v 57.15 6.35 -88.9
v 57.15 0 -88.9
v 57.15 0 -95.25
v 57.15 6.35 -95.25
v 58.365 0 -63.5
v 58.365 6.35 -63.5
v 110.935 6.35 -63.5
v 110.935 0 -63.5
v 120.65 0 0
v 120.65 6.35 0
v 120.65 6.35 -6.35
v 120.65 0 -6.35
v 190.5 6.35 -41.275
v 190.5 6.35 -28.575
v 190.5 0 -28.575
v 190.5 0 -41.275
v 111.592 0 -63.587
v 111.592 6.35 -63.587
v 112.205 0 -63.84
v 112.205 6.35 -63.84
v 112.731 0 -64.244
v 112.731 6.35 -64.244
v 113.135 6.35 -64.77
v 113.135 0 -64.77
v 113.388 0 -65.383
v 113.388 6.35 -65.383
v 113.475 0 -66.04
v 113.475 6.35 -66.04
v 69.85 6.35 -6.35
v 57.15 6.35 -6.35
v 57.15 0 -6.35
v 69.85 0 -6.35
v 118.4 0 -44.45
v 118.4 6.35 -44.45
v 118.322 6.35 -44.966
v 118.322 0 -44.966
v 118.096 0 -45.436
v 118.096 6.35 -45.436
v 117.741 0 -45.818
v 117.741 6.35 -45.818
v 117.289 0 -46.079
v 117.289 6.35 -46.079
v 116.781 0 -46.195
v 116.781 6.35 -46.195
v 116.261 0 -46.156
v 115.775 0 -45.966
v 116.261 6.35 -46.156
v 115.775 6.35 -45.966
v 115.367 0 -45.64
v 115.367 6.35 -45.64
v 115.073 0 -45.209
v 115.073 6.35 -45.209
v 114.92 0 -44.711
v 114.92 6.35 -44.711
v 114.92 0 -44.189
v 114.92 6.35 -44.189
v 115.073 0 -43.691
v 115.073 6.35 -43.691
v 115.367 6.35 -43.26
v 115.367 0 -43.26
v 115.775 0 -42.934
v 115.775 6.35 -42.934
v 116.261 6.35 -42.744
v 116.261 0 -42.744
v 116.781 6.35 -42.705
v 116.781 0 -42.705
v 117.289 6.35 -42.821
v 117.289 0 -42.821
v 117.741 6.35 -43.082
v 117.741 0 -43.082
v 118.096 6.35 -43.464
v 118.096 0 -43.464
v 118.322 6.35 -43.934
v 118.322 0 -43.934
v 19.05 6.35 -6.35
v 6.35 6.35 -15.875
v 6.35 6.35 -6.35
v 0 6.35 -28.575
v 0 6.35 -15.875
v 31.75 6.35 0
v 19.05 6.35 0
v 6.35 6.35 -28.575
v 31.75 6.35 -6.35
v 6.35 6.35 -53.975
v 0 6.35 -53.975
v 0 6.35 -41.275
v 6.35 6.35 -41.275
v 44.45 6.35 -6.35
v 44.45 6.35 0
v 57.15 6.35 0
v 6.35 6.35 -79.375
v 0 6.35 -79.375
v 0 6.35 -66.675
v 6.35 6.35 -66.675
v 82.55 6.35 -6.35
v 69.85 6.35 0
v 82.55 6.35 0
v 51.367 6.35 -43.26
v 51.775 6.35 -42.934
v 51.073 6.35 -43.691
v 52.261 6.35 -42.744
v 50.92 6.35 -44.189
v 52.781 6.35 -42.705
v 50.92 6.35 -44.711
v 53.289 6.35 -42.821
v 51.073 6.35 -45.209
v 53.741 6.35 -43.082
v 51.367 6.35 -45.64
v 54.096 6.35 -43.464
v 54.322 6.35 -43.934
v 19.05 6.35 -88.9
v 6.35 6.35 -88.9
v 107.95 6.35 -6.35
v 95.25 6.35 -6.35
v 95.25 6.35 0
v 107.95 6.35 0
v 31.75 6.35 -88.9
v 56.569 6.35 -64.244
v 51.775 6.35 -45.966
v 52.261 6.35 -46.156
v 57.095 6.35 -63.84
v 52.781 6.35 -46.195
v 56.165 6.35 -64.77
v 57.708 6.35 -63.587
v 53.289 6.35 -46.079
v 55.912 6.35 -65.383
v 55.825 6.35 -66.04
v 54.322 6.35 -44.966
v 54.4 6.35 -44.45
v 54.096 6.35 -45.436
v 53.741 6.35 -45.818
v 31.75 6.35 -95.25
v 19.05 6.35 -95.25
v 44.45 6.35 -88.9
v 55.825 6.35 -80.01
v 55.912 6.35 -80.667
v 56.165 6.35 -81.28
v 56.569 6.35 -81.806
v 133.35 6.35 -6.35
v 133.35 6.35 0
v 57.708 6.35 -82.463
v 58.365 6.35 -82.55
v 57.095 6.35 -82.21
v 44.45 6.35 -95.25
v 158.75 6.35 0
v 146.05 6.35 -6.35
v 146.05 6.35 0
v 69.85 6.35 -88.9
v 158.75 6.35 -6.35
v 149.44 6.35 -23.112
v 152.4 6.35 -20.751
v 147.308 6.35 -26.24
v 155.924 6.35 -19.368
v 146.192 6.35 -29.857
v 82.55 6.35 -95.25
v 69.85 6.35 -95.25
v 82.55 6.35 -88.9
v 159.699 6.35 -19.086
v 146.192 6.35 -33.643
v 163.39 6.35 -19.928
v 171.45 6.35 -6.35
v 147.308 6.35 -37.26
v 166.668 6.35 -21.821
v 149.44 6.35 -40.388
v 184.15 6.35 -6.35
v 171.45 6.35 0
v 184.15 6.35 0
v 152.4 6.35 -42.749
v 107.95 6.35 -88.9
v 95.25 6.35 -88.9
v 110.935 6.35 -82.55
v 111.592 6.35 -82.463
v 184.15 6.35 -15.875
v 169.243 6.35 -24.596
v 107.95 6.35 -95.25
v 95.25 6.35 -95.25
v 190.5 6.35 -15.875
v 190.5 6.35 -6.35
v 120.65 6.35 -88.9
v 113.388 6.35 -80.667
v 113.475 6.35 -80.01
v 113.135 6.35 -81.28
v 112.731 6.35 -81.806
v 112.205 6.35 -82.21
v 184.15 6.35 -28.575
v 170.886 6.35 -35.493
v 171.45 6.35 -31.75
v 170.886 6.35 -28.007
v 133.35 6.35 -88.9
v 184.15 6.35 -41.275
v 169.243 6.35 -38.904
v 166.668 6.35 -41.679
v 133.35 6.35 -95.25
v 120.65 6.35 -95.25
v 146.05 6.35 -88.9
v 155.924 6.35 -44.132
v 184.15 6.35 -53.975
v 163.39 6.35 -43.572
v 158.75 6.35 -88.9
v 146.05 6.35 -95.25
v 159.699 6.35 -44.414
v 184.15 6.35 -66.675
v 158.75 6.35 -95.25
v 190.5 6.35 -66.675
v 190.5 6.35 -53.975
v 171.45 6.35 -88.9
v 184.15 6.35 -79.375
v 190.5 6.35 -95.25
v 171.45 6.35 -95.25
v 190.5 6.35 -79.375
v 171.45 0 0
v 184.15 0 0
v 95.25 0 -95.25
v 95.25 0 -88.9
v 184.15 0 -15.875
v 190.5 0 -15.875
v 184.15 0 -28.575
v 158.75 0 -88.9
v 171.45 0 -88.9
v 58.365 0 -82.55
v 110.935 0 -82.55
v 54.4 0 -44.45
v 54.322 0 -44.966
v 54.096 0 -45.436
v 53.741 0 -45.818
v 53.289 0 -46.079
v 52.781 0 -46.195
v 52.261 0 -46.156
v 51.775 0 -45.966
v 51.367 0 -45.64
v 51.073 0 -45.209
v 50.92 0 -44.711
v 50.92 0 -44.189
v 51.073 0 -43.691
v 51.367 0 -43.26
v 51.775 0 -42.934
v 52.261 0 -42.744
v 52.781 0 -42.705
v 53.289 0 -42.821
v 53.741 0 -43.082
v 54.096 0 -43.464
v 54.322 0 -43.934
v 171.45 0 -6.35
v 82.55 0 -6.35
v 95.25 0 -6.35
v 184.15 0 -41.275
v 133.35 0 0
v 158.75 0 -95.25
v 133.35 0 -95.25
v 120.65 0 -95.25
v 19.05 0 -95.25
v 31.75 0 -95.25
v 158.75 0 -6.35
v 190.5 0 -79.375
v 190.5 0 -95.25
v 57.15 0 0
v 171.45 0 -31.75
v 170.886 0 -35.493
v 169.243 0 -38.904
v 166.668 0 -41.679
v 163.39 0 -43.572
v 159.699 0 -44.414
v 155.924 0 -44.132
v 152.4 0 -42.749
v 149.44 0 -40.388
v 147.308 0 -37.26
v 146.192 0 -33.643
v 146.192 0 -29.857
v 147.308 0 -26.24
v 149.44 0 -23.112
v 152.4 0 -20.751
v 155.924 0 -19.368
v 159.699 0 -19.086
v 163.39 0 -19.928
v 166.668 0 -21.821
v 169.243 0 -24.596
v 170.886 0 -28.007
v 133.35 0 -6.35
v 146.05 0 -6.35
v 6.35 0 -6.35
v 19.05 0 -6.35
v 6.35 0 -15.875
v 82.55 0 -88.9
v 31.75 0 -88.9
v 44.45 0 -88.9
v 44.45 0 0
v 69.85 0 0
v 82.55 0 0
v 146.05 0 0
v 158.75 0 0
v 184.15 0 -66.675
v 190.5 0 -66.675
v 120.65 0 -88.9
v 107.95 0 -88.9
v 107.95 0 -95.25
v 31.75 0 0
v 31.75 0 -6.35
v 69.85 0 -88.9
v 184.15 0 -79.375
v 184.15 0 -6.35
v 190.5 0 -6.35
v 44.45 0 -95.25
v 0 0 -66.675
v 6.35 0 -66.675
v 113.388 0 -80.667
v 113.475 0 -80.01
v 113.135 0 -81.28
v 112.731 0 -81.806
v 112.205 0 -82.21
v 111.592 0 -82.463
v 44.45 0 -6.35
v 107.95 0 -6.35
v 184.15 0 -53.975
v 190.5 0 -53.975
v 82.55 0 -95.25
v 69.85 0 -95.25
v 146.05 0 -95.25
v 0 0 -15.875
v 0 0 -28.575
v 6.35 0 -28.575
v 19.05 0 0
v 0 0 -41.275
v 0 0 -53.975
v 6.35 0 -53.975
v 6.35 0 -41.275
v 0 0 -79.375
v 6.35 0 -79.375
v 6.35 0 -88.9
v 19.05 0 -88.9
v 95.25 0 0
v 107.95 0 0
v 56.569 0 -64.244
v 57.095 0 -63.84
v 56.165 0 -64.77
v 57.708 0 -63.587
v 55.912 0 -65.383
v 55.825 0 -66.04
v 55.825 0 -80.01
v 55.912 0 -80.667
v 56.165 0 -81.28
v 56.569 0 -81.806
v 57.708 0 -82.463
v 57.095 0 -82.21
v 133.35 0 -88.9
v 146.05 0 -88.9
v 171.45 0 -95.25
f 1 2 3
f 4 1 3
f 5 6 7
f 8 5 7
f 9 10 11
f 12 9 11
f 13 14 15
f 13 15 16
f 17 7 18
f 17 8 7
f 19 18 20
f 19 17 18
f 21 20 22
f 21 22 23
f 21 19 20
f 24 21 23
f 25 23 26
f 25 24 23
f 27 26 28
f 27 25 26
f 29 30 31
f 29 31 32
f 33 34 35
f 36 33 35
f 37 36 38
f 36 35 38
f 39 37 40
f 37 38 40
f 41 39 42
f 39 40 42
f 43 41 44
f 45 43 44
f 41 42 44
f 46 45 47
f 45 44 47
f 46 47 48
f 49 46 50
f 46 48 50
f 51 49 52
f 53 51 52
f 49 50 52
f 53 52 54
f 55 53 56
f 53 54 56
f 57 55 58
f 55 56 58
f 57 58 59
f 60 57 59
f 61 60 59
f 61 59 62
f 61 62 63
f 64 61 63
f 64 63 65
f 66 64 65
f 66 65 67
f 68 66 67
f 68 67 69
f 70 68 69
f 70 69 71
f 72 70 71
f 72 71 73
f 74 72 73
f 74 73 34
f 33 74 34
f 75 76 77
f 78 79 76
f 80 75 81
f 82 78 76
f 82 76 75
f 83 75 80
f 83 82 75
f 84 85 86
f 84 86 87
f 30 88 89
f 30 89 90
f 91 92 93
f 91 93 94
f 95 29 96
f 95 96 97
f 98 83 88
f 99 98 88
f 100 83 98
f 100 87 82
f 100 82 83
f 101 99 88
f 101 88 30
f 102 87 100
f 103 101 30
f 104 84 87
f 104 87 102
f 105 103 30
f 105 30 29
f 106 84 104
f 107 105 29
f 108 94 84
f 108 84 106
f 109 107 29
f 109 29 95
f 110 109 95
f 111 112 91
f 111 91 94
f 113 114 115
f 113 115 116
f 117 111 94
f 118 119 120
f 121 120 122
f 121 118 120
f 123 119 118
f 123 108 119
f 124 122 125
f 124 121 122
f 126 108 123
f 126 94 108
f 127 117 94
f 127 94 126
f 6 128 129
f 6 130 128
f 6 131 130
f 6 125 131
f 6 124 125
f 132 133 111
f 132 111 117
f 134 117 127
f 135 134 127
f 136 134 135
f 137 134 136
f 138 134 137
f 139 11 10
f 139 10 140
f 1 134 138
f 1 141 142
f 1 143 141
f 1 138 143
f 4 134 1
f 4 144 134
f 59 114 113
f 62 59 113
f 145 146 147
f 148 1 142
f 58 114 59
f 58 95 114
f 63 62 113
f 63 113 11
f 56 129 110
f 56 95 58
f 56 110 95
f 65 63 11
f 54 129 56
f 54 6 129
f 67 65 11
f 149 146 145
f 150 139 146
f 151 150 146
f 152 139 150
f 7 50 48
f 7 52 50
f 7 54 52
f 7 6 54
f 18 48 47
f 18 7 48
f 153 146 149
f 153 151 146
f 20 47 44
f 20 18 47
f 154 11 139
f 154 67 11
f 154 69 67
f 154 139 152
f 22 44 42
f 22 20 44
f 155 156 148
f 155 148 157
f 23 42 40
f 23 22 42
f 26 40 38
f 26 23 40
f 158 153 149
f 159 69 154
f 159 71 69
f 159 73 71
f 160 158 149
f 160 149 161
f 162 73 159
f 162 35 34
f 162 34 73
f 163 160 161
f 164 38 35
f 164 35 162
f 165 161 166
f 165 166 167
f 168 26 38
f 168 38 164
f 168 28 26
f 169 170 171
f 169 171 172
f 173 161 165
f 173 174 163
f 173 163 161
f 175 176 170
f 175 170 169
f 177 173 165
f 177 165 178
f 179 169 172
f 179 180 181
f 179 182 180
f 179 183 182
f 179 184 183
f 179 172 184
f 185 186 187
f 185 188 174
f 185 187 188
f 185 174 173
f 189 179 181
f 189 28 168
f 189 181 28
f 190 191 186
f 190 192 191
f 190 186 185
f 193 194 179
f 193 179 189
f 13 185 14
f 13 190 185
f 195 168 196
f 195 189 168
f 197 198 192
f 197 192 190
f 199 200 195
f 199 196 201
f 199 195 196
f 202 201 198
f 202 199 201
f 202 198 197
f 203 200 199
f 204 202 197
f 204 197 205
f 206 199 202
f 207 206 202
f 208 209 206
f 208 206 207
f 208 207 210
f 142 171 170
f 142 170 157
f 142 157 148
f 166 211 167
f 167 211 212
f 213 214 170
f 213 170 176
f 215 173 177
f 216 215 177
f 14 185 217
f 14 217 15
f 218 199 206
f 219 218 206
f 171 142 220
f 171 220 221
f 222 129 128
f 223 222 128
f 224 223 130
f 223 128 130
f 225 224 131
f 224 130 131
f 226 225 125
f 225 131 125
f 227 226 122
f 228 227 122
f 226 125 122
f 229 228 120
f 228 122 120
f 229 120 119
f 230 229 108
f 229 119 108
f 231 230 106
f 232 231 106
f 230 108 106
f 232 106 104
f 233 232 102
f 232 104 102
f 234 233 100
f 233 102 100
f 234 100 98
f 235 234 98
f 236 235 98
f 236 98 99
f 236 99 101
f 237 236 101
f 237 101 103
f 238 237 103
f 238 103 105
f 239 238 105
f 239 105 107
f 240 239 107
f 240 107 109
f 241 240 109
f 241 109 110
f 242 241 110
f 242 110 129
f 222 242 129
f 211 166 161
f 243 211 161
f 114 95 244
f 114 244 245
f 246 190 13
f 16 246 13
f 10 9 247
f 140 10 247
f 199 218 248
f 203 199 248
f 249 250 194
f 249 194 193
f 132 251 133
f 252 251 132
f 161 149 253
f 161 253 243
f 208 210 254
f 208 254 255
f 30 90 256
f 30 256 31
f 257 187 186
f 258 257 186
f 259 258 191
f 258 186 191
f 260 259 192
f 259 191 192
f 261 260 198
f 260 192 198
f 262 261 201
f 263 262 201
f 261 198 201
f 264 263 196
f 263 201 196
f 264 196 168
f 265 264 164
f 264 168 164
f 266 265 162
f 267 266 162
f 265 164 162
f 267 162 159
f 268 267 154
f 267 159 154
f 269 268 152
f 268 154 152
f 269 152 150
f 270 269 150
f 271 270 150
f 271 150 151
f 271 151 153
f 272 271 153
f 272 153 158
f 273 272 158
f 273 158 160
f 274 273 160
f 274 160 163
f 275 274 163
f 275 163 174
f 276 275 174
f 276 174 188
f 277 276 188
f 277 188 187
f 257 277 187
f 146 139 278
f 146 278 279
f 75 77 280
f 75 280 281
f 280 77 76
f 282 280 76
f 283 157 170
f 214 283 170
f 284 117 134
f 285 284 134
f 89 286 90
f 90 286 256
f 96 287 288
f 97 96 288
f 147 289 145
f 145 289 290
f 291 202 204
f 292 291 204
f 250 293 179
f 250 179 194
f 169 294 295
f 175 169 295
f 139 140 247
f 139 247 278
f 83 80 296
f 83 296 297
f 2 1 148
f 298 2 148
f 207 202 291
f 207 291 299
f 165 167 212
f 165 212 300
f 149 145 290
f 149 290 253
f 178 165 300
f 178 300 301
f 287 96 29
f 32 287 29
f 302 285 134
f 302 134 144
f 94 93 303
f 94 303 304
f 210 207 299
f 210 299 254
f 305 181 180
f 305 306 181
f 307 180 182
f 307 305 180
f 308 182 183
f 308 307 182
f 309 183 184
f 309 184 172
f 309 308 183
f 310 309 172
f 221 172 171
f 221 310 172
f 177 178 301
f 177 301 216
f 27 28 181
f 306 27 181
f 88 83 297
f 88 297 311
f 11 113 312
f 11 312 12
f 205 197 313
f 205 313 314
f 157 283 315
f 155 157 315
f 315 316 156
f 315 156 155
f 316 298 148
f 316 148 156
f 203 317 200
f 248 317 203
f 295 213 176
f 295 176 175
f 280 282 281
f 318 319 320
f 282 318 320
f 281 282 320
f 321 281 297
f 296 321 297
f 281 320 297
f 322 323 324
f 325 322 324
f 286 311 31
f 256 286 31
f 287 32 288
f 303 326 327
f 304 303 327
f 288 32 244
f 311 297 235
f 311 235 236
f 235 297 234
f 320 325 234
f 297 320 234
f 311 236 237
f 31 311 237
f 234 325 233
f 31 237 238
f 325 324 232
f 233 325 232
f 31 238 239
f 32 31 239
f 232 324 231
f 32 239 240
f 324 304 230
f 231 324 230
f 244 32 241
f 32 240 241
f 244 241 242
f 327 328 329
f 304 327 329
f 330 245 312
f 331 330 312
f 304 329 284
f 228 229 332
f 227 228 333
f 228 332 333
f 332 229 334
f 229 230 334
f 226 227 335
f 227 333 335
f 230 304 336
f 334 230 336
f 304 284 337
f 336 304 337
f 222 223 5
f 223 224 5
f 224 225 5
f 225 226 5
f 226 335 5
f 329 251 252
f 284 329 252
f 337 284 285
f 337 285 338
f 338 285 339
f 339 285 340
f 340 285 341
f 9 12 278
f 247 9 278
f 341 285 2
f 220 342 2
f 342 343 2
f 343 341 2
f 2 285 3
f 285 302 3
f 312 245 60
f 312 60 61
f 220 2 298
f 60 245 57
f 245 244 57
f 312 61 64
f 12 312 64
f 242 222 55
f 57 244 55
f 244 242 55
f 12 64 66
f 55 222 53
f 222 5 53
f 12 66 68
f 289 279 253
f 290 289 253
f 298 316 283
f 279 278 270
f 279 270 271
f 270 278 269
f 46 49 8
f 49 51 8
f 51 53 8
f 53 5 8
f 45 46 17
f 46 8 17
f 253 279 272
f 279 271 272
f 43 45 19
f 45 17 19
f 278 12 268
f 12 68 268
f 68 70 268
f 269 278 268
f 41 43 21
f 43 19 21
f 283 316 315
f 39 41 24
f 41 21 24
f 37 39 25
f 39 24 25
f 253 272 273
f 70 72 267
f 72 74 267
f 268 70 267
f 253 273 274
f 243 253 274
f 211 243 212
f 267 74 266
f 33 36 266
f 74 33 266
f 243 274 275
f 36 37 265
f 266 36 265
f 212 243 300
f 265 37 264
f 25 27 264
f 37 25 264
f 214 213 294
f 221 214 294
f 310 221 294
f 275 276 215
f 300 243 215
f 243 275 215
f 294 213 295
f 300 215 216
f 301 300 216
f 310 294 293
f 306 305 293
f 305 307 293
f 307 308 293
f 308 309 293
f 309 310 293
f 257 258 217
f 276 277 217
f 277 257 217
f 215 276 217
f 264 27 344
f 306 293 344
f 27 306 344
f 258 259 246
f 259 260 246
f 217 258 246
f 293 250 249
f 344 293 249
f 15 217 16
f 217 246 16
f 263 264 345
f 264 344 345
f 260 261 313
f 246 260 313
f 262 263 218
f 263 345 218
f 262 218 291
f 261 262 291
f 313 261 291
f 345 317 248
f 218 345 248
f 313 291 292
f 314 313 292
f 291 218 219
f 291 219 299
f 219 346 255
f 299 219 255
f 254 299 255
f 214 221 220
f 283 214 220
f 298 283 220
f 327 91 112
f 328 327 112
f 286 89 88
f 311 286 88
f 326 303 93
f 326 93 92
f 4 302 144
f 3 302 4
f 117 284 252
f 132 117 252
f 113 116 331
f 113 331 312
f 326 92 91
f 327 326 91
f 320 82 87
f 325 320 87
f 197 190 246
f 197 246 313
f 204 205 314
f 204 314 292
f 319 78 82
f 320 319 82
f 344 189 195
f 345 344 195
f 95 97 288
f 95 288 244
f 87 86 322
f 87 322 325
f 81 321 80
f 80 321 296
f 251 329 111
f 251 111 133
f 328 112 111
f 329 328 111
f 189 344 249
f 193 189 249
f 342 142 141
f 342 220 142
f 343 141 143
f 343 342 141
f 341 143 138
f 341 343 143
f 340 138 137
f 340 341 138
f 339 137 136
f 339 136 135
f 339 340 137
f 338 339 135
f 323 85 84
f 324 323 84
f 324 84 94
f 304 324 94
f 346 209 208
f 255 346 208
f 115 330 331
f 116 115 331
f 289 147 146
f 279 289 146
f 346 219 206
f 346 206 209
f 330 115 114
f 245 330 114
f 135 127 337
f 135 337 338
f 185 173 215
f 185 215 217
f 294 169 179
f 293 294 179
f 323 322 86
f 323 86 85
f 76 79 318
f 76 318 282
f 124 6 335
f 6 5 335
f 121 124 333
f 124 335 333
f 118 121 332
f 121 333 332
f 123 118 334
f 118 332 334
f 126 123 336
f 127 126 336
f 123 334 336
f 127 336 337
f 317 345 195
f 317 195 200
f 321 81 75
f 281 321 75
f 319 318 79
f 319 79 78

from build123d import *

# Parameters (mm, degrees)
SKETCH1_W           = 431.8
SKETCH1_H           = 95.25
BOSS_EXTRUDE1_DEPTH = 6.35
SKETCH2_W           = 12.7
SKETCH2_H           = 6.35
CUT_EXTRUDE1_DEPTH  = 7.35
LPATTERN1_COUNT     = 17
LPATTERN1_PITCH     = 25.4
SKETCH3_W           = 6.35
SKETCH3_H           = 6.35
CUT_EXTRUDE2_DEPTH  = 7.35
SKETCH5_W           = 6.35
SKETCH5_H           = 12.7
CUT_EXTRUDE4_DEPTH  = 7.35
LPATTERN2_COUNT     = 2
LPATTERN2_PITCH     = 25.4
LPATTERN2_COL_COUNT = 2
LPATTERN2_COL_PITCH = 25.4
SKETCH6_W           = 114.3
SKETCH6_H           = 46.0375
CUT_EXTRUDE5_DEPTH  = 7.35
SKETCH7_R           = 1.75
CUT_EXTRUDE6_DEPTH  = 7.35
SKETCH8_W           = 6.35
SKETCH8_H           = 9.525
SKETCH8_H_2         = 12.7
CUT_EXTRUDE7_DEPTH  = 7.35
LPATTERN3_COUNT     = 2
LPATTERN3_PITCH     = 425.45
SKETCH9_W           = 241.3
SKETCH9_H           = 95.25
CUT_EXTRUDE8_DEPTH  = 7.35
SKETCH11_W          = 6.35
SKETCH11_H          = 6.35
BOSS_EXTRUDE2_DEPTH = 6.35
SKETCH12_W          = 57.65
SKETCH12_H          = 19.05
CUT_EXTRUDE10_DEPTH = 7.35
FILLET1_R           = 2.54
SKETCH13_R          = 12.7
CUT_EXTRUDE11_DEPTH = 7.35


with BuildPart() as part:
    # Sketch1 → Boss-Extrude1 (new body)
    with BuildSketch(Plane(origin=(0, 0, 0), x_dir=(1, 0, 0), z_dir=(0, 1, 0))):
        with Locations((215.9, 47.625)):
            Rectangle(SKETCH1_W, SKETCH1_H)
    extrude(amount=BOSS_EXTRUDE1_DEPTH)

    # Sketch2 → Cut-Extrude1 (cut, through all)
    with BuildSketch(Plane(origin=(0, 6.35, 0), x_dir=(1, 0, 0), z_dir=(0, 1, 0))):
        with Locations((12.7, 92.075)):
            Rectangle(SKETCH2_W, SKETCH2_H)
        with Locations((12.7, 3.175)):
            Rectangle(SKETCH2_W, SKETCH2_H)
    cut_extrude1 = extrude(amount=-CUT_EXTRUDE1_DEPTH, mode=Mode.SUBTRACT)

    # LPattern1: Cut-Extrude1 ×17
    with Locations(*[(i * LPATTERN1_PITCH, 0, 0) for i in range(1, LPATTERN1_COUNT)]):
        add(cut_extrude1, mode=Mode.SUBTRACT)

    # Sketch3 → Cut-Extrude2 (cut, through all)
    with BuildSketch(Plane(origin=(0, 6.35, 0), x_dir=(1, 0, 0), z_dir=(0, 1, 0))):
        with Locations((3.175, 92.075)):
            Rectangle(SKETCH3_W, SKETCH3_H)
        with Locations((3.175, 3.175)):
            Rectangle(SKETCH3_W, SKETCH3_H)
        with Locations((428.625, 92.075)):
            Rectangle(SKETCH3_W, SKETCH3_H)
        with Locations((428.625, 3.175)):
            Rectangle(SKETCH3_W, SKETCH3_H)
    extrude(amount=-CUT_EXTRUDE2_DEPTH, mode=Mode.SUBTRACT)

    # Sketch5 → Cut-Extrude4 (cut, through all)
    with BuildSketch(Plane(origin=(0, 6.35, 0), x_dir=(1, 0, 0), z_dir=(0, 1, 0))):
        with Locations((187.325, 47.625)):
            Rectangle(SKETCH5_W, SKETCH5_H)
        with Locations((307.975, 47.625)):
            Rectangle(SKETCH5_W, SKETCH5_H)
    cut_extrude4 = extrude(amount=-CUT_EXTRUDE4_DEPTH, mode=Mode.SUBTRACT)

    # LPattern2: Cut-Extrude4 ×2
    with Locations(*[(0, 0, -i * LPATTERN2_PITCH) for i in range(1, LPATTERN2_COUNT)]):
        add(cut_extrude4, mode=Mode.SUBTRACT)

    # LPattern2 col: Cut-Extrude4 ×2
    with Locations(*[(0, 0, i * LPATTERN2_COL_PITCH) for i in range(1, LPATTERN2_COL_COUNT)]):
        add(cut_extrude4, mode=Mode.SUBTRACT)

    # Sketch6 → Cut-Extrude5 (cut, through all)
    with BuildSketch(Plane(origin=(0, 6.35, 0), x_dir=(1, 0, 0), z_dir=(0, 1, 0))):
        with Locations((247.65, 47.625)):
            Rectangle(SKETCH6_W, SKETCH6_H)
    extrude(amount=-CUT_EXTRUDE5_DEPTH, mode=Mode.SUBTRACT)

    # Sketch7 → Cut-Extrude6 (cut, through all)
    with BuildSketch(Plane(origin=(0, 6.35, 0), x_dir=(1, 0, 0), z_dir=(0, 1, 0))):
        with Locations((52.65, 44.45)):
            Circle(SKETCH7_R)
        with Locations((116.65, 44.45)):
            Circle(SKETCH7_R)
        with Locations((315.15, 44.45)):
            Circle(SKETCH7_R)
        with Locations((379.15, 44.45)):
            Circle(SKETCH7_R)
    extrude(amount=-CUT_EXTRUDE6_DEPTH, mode=Mode.SUBTRACT)

    # Sketch8 → Cut-Extrude7 (cut, through all)
    with BuildSketch(Plane(origin=(0, 6.35, 0), x_dir=(1, 0, 0), z_dir=(0, 1, 0))):
        with Locations((3.175, 84.1375)):
            Rectangle(SKETCH8_W, SKETCH8_H)
        with Locations((3.175, 11.1125)):
            Rectangle(SKETCH8_W, SKETCH8_H)
        with Locations((3.175, 34.925)):
            Rectangle(SKETCH8_W, SKETCH8_H_2)
        with Locations((3.175, 60.325)):
            Rectangle(SKETCH8_W, SKETCH8_H_2)
    cut_extrude7 = extrude(amount=-CUT_EXTRUDE7_DEPTH, mode=Mode.SUBTRACT)

    # LPattern3: Cut-Extrude7 ×2
    with Locations(*[(i * LPATTERN3_PITCH, 0, 0) for i in range(1, LPATTERN3_COUNT)]):
        add(cut_extrude7, mode=Mode.SUBTRACT)

    # Sketch9 → Cut-Extrude8 (cut, through all)
    with BuildSketch(Plane(origin=(0, 6.35, 0), x_dir=(1, 0, 0), z_dir=(0, 1, 0))):
        with Locations((311.15, 47.625)):
            Rectangle(SKETCH9_W, SKETCH9_H)
    extrude(amount=-CUT_EXTRUDE8_DEPTH, mode=Mode.SUBTRACT)

    # Sketch11 → Boss-Extrude2 (add, through all)
    with BuildSketch(Plane(origin=(0, 6.35, 0), x_dir=(1, 0, 0), z_dir=(0, 1, 0))):
        with Locations((187.325, 92.075)):
            Rectangle(SKETCH11_W, SKETCH11_H)
    extrude(amount=-BOSS_EXTRUDE2_DEPTH)

    # Sketch12 → Cut-Extrude10 (cut, through all)
    with BuildSketch(Plane(origin=(0, 6.35, 0), x_dir=(1, 0, 0), z_dir=(0, 1, 0))):
        with Locations((84.65, 73.025)):
            Rectangle(SKETCH12_W, SKETCH12_H)
    extrude(amount=-CUT_EXTRUDE10_DEPTH, mode=Mode.SUBTRACT)

    # Fillet1
    fillet1_edges = [part.edges().sort_by_distance(p)[0] for p in [
        (55.825, 3.175, -63.5),
        (55.825, 3.175, -82.55),
        (113.475, 3.175, -82.55),
        (113.475, 3.175, -63.5),
    ]]
    fillet(fillet1_edges, radius=FILLET1_R)

    # Sketch13 → Cut-Extrude11 (cut, through all)
    with BuildSketch(Plane(origin=(0, 6.35, 0), x_dir=(1, 0, 0), z_dir=(0, 1, 0))):
        with Locations((158.75, 31.75)):
            Circle(SKETCH13_R)
    extrude(amount=-CUT_EXTRUDE11_DEPTH, mode=Mode.SUBTRACT)


solid = part.part
